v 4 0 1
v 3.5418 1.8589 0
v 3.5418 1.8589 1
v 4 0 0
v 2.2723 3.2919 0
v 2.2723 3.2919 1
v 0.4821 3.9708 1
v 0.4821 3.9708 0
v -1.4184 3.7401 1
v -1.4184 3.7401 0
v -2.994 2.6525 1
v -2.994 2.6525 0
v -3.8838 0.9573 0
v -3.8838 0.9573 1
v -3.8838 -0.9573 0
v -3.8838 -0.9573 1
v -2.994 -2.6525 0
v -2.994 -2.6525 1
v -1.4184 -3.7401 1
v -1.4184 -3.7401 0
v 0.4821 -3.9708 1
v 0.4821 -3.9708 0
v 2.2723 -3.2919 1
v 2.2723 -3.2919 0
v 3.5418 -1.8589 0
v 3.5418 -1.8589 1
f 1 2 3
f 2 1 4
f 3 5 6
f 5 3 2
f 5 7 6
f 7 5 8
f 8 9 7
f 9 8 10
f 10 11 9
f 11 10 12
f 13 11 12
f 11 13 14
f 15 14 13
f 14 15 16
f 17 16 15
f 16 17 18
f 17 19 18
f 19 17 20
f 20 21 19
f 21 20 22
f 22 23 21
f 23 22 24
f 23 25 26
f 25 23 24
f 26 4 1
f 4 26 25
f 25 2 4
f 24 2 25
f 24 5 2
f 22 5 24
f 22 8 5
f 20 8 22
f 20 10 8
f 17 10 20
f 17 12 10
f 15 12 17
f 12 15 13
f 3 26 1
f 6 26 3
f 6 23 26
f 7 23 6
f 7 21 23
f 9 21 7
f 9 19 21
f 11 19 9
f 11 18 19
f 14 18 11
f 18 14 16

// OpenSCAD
// expect: has no parameter "height"
module post(d, h) cylinder(d = d, h = h);
post(d = 8, height = 20);
